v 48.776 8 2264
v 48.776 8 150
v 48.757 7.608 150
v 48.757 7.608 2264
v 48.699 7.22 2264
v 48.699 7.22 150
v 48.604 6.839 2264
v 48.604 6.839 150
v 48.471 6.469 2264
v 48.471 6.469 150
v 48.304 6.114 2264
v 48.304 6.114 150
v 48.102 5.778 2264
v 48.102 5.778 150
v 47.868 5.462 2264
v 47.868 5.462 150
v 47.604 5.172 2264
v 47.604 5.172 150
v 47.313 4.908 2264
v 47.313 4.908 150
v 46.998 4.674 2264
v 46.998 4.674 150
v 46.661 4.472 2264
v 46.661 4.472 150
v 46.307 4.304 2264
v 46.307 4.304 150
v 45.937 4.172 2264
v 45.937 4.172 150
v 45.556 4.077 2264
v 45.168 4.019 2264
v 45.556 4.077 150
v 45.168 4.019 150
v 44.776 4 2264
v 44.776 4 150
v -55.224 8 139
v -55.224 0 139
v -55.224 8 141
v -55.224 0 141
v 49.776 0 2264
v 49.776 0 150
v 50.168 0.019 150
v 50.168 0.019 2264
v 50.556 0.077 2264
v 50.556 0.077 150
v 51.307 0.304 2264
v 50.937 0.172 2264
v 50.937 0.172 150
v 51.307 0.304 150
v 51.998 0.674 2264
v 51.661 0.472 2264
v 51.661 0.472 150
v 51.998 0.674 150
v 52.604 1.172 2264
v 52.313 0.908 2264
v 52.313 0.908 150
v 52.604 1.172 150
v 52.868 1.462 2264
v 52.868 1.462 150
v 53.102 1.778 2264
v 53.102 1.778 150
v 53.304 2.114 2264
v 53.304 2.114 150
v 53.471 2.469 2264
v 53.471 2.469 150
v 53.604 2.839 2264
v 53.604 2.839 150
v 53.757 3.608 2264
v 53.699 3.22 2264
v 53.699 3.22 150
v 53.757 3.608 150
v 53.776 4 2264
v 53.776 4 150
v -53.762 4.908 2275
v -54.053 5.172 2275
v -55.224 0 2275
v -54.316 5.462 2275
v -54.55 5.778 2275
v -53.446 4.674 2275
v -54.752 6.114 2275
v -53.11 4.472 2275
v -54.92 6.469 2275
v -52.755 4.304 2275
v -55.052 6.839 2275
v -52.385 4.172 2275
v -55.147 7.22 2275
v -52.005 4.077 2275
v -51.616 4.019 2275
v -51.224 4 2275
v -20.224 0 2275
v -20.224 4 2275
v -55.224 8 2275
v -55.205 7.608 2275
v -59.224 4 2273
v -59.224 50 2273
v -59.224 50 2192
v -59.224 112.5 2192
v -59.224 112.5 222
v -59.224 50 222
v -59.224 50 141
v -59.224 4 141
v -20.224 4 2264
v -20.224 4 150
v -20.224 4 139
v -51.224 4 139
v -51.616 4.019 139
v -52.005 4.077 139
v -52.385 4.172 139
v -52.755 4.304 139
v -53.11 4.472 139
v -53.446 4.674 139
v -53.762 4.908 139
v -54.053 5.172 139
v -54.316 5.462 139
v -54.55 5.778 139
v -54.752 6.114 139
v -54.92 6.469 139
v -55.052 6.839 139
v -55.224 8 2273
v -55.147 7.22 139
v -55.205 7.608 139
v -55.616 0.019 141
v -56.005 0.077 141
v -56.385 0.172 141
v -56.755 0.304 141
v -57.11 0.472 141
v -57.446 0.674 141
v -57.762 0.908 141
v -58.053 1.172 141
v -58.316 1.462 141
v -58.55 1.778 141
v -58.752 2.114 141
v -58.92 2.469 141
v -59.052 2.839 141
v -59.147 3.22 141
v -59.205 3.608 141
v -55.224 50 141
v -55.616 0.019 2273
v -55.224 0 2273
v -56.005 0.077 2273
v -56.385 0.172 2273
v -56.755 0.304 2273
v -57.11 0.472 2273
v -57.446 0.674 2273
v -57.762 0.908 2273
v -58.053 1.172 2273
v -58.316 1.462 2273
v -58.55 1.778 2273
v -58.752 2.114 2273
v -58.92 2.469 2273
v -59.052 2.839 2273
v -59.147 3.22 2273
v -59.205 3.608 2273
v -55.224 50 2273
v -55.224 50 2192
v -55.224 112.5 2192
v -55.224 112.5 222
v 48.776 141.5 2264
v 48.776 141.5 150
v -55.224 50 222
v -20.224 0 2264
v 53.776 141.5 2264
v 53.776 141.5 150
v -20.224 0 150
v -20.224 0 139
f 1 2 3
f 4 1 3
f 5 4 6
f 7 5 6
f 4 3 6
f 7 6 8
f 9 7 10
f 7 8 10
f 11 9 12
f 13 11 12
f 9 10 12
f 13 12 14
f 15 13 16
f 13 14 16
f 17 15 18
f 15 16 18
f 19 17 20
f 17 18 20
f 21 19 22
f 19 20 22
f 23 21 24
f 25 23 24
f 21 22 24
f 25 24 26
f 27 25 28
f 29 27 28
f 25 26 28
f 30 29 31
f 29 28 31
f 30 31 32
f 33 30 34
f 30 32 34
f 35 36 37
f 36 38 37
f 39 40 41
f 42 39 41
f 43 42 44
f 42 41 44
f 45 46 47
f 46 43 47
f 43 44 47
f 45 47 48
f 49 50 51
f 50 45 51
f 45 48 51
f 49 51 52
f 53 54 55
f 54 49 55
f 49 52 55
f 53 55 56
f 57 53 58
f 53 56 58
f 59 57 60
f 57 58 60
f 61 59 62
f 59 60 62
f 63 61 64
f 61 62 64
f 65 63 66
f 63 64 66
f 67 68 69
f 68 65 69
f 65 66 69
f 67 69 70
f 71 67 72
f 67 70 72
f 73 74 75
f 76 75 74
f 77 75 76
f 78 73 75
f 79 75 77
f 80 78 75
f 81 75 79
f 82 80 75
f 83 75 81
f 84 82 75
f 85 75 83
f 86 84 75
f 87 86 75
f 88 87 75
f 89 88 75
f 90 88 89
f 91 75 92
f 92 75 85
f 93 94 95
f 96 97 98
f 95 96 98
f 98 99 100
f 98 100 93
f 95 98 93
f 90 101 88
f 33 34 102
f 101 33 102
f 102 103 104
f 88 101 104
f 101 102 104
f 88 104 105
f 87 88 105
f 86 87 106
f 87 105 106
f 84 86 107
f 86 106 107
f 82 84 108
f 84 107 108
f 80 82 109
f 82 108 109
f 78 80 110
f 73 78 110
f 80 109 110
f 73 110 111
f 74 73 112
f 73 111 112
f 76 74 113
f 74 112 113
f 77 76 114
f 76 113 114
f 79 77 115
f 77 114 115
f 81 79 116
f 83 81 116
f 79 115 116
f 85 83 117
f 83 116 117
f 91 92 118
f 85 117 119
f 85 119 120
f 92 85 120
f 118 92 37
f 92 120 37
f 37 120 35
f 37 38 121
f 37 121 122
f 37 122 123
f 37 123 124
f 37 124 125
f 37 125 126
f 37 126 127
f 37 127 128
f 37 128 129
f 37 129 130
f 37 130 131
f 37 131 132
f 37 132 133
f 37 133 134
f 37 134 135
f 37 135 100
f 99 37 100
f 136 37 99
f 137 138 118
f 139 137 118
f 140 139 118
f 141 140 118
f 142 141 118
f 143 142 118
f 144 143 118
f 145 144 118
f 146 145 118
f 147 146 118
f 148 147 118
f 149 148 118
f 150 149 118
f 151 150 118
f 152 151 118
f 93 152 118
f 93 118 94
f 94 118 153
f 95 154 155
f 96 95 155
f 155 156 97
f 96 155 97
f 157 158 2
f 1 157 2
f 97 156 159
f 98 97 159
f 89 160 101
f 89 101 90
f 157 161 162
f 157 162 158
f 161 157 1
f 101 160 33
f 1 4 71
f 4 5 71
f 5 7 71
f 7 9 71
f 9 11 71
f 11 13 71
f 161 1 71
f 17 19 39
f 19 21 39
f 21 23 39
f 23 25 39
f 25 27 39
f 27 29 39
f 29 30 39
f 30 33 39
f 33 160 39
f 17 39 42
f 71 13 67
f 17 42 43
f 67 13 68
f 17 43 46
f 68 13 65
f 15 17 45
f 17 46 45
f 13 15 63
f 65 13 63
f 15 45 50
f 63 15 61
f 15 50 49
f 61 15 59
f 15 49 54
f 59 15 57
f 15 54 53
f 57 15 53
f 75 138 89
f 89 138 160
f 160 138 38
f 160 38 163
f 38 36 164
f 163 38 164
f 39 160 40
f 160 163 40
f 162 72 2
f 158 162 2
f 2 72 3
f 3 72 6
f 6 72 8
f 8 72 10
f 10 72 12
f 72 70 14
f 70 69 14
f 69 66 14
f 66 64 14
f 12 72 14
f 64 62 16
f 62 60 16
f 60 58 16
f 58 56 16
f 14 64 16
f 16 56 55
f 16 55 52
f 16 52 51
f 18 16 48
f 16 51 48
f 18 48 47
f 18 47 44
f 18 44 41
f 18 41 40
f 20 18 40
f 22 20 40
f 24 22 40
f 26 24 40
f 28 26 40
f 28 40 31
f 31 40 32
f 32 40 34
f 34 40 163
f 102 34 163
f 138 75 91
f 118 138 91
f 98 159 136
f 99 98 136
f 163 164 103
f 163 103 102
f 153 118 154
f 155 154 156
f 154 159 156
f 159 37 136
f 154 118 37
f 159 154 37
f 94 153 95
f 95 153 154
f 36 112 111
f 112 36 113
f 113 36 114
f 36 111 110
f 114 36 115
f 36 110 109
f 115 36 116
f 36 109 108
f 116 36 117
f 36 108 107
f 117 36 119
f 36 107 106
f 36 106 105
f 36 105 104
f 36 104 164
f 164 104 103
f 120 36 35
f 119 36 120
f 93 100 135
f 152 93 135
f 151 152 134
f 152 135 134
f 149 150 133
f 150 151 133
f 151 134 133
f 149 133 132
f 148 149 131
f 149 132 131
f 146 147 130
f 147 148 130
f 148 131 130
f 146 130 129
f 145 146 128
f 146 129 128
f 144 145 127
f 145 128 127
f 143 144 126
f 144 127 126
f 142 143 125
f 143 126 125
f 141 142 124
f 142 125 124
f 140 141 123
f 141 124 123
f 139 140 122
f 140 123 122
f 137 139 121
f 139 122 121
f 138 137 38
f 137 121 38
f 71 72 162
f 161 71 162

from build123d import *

# Parameters (mm, degrees)
F1_DEPTH = 2414
F2_W     = 92.1814972758
F2_H     = 150
F2_W_2   = 70
F2_W_3   = 4
F3_DEPTH = 141.501
F4_DEPTH = 139
F5_DEPTH = 139
F6_W     = 50
F6_H     = 2
F7_DEPTH = 25


with BuildPart() as f1:
    # F0 (on Top) → F1 (new body)
    with BuildSketch(Plane.XY):
        with BuildLine():
            Line((-55.2241730846, 112.5), (-59.2241730846, 112.5))
            Line((-59.2241730846, 112.5), (-59.2241730846, 4))
            ThreePointArc((-59.2241730846, 4), (-58.0526002093, 1.1715728753), (-55.2241730846, 0))
            Line((-55.2241730846, 0), (49.7758269154, 0))
            ThreePointArc((49.7758269154, 0), (52.6042540402, 1.1715728753), (53.7758269154, 4))
            Line((53.7758269154, 4), (53.7758269154, 141.5))
            Line((53.7758269154, 141.5), (48.7758269154, 141.5))
            Line((48.7758269154, 141.5), (48.7758269154, 8))
            ThreePointArc((48.7758269154, 8), (47.6042540402, 5.1715728753), (44.7758269154, 4))
            Line((44.7758269154, 4), (-51.2241730846, 4))
            ThreePointArc((-51.2241730846, 4), (-54.0526002093, 5.1715728753), (-55.2241730846, 8))
            Line((-55.2241730846, 8), (-55.2241730846, 112.5))
        make_face()
    extrude(amount=F1_DEPTH)

    # F2 (on face) → F3 (cut, through all)
    with BuildSketch(Plane.XZ):
        with Locations((99.8665755533, 2339)):
            Rectangle(F2_W, F2_H)
        with Locations((14.7758269154, 2339)):
            Rectangle(F2_W_2, F2_H)
        with Locations((51.7758269154, 2339)):
            Rectangle(F2_W_3, F2_H)
        with Locations((51.7758269154, 75)):
            Rectangle(F2_W_3, F2_H)
        with Locations((99.8665755533, 75)):
            Rectangle(F2_W, F2_H)
        with Locations((14.7758269154, 75)):
            Rectangle(F2_W_2, F2_H)
    extrude(amount=-F3_DEPTH, mode=Mode.SUBTRACT)

    # F4 (cut): a face of the model
    f4_faces = [f1.faces().sort_by_distance(p)[0] for p in [
        (-21.4148556619, 2, 2414),
    ]]
    extrude(f4_faces, amount=-F4_DEPTH, mode=Mode.SUBTRACT)

    # F5 (cut): a face of the model
    f5_faces = [f1.faces().sort_by_distance(p)[0] for p in [
        (-21.4148556619, 2, 0),
    ]]
    extrude(f5_faces, amount=-F5_DEPTH, mode=Mode.SUBTRACT)

    # F6 (on face) → F7 (cut)
    with BuildSketch(Plane.YZ.offset(-55.2241730846)):
        Polygon((50, 139), (112.5, 139), (112.5, 222), (50, 222), (50, 141), align=None)
        with Locations((25, 140)):
            Rectangle(F6_W, F6_H)
        Polygon((112.5, 2192), (112.5, 2275), (50, 2275), (50, 2273), (50, 2192), align=None)
        with Locations((25, 2274)):
            Rectangle(F6_W, F6_H)
    extrude(amount=-F7_DEPTH, mode=Mode.SUBTRACT)


solid = f1.part
